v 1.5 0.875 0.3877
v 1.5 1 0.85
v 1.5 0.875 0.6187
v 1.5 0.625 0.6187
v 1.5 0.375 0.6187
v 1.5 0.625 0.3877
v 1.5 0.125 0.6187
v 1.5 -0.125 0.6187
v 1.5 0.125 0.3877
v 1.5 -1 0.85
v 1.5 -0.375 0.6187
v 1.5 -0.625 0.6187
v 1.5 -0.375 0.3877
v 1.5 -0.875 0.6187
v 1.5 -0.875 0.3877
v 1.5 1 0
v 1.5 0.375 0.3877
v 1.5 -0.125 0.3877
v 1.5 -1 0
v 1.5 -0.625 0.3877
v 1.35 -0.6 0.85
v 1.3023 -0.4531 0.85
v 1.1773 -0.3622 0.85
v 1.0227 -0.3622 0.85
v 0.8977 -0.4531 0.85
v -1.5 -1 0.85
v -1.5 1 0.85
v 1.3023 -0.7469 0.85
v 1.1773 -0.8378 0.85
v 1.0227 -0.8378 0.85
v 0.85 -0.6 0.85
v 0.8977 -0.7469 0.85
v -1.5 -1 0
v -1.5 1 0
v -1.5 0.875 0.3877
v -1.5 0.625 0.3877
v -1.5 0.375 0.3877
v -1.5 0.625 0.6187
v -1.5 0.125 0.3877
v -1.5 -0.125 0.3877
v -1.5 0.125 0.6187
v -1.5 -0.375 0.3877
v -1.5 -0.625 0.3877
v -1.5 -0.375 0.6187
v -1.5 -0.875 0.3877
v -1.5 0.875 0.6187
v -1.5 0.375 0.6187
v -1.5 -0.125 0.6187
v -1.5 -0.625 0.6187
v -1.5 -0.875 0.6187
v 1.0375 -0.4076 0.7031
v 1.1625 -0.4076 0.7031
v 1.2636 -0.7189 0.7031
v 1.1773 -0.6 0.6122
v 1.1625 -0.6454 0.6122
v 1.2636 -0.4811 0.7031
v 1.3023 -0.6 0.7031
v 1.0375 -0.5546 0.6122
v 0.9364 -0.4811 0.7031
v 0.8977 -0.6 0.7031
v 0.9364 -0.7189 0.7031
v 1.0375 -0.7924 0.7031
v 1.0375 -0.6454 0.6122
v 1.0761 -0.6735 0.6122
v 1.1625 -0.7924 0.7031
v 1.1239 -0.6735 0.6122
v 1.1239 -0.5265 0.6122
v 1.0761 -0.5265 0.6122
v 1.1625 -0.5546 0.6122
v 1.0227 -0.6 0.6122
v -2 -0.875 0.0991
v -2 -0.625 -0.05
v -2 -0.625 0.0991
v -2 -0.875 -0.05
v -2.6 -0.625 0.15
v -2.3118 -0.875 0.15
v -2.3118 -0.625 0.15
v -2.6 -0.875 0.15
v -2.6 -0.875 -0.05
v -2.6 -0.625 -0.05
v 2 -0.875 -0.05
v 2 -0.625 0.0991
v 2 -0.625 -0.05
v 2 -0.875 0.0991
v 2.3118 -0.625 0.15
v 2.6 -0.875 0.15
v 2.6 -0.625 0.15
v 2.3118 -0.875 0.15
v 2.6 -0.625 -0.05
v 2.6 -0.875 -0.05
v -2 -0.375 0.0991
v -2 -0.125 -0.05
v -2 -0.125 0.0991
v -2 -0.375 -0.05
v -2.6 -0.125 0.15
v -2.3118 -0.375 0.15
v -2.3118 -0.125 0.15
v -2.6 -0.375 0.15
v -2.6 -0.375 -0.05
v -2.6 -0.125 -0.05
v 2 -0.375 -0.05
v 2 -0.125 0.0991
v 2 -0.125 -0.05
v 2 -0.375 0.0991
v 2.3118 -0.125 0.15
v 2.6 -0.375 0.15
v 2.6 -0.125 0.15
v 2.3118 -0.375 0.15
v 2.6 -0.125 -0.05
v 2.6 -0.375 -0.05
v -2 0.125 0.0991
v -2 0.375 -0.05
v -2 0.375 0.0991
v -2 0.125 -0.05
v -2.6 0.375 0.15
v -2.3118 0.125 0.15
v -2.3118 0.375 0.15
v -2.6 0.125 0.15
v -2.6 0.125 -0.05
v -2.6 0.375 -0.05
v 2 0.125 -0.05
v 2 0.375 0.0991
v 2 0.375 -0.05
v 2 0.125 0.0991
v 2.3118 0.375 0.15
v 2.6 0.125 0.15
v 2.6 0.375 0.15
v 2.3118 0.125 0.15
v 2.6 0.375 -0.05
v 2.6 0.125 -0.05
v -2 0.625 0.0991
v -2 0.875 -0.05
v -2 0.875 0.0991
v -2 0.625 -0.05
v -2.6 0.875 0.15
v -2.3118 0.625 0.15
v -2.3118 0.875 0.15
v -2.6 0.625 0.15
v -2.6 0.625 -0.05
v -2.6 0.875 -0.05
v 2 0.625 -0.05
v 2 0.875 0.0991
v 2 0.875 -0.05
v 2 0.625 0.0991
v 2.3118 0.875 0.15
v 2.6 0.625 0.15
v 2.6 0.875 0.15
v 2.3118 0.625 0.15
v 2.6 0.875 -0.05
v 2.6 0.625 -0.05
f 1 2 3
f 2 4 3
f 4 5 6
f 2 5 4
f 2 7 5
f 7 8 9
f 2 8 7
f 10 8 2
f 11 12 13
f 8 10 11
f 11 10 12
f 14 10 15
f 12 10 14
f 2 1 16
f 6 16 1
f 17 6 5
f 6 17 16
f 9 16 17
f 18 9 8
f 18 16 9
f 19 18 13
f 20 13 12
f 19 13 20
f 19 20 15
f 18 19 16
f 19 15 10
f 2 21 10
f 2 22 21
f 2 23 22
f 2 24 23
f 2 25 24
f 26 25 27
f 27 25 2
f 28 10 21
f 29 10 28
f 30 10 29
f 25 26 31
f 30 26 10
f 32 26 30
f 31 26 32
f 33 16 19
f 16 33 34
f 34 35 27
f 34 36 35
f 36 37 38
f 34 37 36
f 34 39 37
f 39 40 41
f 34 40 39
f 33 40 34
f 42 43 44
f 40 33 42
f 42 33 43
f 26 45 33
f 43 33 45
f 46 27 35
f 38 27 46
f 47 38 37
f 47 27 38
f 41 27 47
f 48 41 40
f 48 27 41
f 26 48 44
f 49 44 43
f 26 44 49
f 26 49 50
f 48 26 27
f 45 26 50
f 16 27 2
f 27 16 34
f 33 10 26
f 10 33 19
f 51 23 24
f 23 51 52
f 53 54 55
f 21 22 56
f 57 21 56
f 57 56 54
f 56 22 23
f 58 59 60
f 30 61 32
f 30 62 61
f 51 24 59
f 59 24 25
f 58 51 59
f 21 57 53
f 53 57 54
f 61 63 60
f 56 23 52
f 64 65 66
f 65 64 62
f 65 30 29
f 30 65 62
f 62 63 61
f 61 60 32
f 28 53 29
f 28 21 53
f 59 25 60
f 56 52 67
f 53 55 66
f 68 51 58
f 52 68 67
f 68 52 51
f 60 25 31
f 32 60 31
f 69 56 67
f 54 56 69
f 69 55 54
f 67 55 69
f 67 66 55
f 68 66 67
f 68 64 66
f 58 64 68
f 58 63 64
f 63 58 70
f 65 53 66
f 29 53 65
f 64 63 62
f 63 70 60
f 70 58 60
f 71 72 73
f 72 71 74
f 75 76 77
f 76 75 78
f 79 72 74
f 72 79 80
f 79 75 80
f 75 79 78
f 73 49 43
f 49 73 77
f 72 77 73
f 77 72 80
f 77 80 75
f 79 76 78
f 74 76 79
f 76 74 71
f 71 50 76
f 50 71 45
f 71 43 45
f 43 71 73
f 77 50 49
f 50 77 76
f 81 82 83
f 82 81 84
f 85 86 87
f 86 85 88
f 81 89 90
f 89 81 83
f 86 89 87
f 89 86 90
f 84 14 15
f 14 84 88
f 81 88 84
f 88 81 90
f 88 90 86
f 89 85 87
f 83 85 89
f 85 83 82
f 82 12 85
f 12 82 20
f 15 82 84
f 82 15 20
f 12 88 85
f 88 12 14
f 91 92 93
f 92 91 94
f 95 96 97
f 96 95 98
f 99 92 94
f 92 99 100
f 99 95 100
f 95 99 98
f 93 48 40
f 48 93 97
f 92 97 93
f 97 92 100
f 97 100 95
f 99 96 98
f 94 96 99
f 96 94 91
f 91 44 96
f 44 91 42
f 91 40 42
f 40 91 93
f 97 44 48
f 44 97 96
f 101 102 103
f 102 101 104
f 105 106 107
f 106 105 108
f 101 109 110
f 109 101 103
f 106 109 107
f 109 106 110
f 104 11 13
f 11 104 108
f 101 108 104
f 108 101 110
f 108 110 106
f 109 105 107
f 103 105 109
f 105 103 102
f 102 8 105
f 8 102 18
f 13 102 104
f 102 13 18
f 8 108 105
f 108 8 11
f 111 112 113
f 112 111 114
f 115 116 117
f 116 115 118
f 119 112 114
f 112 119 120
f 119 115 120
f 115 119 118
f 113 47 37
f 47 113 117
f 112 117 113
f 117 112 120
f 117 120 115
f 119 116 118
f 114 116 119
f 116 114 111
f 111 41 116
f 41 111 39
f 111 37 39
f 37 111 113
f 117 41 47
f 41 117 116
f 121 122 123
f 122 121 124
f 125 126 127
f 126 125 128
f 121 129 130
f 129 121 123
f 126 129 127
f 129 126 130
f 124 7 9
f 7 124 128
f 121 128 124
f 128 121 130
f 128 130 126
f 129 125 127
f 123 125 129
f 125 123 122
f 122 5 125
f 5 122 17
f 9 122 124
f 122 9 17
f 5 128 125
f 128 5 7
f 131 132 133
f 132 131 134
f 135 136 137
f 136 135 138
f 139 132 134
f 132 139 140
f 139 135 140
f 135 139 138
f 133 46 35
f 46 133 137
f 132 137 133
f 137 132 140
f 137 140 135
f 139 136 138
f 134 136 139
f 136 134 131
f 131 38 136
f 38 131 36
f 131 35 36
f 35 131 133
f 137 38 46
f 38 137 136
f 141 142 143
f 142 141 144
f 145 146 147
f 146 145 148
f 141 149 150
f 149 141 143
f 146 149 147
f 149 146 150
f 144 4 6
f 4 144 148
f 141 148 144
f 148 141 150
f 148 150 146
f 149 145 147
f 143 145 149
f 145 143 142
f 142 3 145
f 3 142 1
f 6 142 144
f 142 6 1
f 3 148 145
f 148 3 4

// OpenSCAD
/*
 * A generic SOP 4.5mm wide, 6.6mm long, 0.65mm pitch packaged part.
 *
 * Author: Ian McInerney
 * Created: July 16, 2015
 *
 */

module pin() {
	translate([0,0.0,0.0])cube([0.6,0.25,0.20], center=true);
	translate([0.5,0.0,0.28])rotate([0.0,60,0.0])translate([0.0,0.0,0.0])cube([0.2,0.25,1.1], center=true);
}


// Assemble the main package and the pins
module main() {
		translate([0.0,0.0,0.85/2])cube([3.0,2.0,0.85], center=true);
}

// Add the marker for pin 1
difference() {
	// The main cube
	main();

	// The pin 1 marker
	translate([1.1,-0.6,0.85])sphere(r=0.25, $fn=10);
}

// Create the pins
for ( i = [-0.75 : 0.5 : 0.75] )
{
    translate([-2.3,i,0.05])pin();
	 translate([2.3,i,0.05])rotate([0.0,0.0,180])pin();
}
